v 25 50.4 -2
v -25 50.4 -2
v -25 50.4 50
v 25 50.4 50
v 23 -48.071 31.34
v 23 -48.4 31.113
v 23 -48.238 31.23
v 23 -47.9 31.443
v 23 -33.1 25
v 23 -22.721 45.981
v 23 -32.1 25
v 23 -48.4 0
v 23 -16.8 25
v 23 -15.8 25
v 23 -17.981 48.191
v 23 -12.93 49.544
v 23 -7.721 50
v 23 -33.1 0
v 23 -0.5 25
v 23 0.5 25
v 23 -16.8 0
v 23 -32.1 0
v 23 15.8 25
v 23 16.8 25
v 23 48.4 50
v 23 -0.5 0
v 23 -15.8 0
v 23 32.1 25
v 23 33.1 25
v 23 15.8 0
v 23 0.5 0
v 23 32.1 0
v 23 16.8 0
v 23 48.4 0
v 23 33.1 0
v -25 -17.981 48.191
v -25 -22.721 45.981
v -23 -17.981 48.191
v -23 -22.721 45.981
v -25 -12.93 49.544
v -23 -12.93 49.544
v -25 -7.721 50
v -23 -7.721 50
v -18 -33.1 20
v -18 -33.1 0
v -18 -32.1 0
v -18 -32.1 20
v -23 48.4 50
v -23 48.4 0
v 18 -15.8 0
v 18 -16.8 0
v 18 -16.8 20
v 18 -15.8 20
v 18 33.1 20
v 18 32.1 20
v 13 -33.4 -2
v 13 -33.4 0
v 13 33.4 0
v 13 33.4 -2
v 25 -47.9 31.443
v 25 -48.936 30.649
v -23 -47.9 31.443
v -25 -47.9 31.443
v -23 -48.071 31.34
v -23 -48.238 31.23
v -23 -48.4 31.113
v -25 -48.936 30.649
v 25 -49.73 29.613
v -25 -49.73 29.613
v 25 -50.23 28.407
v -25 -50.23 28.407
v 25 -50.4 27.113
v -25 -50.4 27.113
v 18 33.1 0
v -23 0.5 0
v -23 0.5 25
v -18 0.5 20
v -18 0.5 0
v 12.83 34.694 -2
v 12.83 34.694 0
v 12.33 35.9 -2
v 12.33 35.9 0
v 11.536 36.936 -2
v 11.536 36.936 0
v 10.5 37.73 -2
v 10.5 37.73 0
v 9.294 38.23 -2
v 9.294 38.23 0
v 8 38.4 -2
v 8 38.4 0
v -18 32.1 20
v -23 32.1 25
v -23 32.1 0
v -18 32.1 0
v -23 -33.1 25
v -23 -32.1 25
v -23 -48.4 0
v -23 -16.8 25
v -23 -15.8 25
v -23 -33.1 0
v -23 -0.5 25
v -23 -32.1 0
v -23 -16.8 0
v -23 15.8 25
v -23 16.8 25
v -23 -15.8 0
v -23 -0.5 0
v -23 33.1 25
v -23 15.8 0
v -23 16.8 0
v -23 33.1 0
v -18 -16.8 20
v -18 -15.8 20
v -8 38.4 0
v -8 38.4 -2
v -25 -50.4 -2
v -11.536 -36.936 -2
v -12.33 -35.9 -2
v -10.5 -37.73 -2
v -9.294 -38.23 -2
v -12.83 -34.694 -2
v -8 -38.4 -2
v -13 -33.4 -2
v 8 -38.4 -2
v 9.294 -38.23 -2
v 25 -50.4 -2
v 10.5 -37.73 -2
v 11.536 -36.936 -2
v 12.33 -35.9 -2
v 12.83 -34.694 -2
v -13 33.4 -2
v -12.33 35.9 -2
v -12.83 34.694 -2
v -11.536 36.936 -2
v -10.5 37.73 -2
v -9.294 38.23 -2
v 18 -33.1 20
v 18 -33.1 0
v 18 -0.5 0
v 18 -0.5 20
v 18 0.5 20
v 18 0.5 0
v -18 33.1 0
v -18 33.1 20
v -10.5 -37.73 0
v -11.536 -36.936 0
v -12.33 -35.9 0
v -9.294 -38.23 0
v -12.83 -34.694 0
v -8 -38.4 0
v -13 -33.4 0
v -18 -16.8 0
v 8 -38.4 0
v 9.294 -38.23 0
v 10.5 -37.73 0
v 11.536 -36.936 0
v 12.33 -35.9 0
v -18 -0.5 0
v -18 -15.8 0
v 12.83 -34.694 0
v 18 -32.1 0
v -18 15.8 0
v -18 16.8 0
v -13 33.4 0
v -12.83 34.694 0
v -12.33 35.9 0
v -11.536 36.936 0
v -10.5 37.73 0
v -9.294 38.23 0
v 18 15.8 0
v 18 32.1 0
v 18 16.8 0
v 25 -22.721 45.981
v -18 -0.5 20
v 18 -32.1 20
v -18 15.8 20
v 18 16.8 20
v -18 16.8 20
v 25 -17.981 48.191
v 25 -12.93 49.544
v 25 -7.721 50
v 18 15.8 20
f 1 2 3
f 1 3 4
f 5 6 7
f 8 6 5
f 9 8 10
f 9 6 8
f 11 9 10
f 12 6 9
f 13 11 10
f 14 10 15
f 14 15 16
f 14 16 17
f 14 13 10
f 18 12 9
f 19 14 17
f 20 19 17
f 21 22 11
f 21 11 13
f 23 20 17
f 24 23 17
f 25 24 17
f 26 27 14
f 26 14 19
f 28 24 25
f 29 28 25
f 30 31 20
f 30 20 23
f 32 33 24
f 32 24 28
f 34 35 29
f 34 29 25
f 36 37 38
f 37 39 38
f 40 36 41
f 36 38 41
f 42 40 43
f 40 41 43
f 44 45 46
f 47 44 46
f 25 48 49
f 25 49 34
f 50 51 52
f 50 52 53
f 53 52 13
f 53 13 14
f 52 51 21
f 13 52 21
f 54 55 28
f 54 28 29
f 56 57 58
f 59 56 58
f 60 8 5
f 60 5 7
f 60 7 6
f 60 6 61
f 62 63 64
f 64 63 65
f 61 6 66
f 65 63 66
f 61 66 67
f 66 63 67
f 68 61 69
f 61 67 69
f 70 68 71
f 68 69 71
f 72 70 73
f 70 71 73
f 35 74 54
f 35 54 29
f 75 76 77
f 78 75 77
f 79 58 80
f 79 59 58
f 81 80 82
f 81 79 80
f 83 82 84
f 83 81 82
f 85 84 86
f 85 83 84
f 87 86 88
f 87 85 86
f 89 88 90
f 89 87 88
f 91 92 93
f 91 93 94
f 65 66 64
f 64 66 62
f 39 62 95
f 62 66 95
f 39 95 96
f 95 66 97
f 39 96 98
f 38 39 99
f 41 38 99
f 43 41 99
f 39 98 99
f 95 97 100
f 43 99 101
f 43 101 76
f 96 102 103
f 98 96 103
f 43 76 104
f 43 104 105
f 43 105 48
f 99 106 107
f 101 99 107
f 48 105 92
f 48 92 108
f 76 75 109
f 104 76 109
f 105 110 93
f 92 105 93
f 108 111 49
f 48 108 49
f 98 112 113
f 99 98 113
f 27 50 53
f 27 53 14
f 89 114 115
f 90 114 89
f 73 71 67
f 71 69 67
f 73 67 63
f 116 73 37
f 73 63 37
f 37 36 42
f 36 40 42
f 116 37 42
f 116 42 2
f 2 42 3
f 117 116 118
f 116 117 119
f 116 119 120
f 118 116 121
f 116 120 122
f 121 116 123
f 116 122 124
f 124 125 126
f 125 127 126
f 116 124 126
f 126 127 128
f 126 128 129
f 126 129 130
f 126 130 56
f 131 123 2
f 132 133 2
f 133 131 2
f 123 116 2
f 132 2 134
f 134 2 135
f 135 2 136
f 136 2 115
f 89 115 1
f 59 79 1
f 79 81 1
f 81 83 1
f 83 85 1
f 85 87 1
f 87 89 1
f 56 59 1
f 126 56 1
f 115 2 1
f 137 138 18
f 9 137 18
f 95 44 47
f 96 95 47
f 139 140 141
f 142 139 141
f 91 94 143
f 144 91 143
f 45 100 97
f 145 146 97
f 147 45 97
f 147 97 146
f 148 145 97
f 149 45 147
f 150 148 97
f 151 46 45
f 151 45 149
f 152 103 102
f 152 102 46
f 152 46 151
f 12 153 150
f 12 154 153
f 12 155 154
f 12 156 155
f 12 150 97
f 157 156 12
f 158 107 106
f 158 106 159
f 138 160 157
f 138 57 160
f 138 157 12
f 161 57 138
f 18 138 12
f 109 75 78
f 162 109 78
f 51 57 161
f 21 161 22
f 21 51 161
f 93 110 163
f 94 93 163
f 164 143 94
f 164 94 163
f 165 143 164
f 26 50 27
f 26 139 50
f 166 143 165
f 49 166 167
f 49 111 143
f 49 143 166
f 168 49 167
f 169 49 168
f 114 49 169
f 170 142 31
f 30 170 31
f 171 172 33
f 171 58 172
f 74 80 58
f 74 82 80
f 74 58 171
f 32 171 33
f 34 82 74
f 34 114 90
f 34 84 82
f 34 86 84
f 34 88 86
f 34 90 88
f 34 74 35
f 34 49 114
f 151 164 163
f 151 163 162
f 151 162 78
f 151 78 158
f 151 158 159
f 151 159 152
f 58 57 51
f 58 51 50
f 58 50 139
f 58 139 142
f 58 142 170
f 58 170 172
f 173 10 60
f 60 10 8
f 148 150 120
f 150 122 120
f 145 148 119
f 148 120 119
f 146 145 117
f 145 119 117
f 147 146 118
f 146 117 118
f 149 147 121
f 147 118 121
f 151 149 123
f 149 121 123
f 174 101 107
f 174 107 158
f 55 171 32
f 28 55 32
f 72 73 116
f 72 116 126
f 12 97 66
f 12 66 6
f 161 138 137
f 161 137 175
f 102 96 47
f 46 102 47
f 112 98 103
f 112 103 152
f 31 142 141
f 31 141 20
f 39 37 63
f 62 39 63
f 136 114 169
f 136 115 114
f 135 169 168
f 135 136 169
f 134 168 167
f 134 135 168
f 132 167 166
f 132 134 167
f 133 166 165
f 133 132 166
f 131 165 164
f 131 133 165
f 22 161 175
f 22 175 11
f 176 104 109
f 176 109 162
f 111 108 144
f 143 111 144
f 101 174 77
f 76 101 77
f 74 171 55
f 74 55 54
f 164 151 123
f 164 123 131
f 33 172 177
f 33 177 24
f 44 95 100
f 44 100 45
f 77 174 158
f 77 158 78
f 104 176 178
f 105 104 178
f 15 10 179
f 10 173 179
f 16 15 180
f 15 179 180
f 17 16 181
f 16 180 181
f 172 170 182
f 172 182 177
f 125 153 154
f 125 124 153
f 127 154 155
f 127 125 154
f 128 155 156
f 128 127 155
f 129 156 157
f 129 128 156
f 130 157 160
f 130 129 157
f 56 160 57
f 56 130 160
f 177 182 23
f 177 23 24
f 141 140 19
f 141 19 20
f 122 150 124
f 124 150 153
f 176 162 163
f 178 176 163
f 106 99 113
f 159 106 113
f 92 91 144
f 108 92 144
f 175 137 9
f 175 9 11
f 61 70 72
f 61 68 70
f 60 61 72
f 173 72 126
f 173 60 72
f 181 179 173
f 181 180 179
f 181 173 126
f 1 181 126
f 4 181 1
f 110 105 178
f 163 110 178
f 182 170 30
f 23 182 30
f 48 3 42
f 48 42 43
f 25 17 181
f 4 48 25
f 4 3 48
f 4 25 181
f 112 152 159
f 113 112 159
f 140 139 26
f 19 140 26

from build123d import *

# Parameters (mm, degrees)
F0_W        = 50
F0_H        = 100.8
F0_W_2      = 46
F0_H_2      = 96.8
F1_DEPTH    = 50
F2_W        = 50
F2_H        = 100.8
F2_W_2      = 26
F2_H_2      = 76.8
F3_DEPTH    = 2
F4_T1_DEPTH = 229.2385588234
F5_R        = 30
F6_T1_DEPTH = 64.4337567297
F7_R        = 5
F8_W        = 5
F8_H        = 1
F9_DEPTH    = 25
F10_SIZE    = 4.99999


# Not quite as in the source:
# - a fillet or chamfer that OpenCascade refuses, or shapes differently, is made with other operations: its cross-section is extruded or revolved along the edge and cut away or added
# - a fillet or chamfer is up to 0.001 mm smaller than in the source, because OpenCascade refuses the exact size


with BuildPart() as f1:
    # F0 (on Top) → F1 (new body)
    with BuildSketch(Plane.XY):
        Rectangle(F0_W, F0_H)
        Rectangle(F0_W_2, F0_H_2, mode=Mode.SUBTRACT)
    extrude(amount=F1_DEPTH)

    # F2 (on Top) → F3 (join)
    with BuildSketch(Plane.XY):
        Rectangle(F2_W, F2_H)
        Rectangle(F2_W_2, F2_H_2, mode=Mode.SUBTRACT)
    extrude(amount=-F3_DEPTH)

    # F4: chamfer of 20 x 34.6410161514 on 1 edges, made by hand

    # F4_s2 → F4_t1 (cut)
    with BuildSketch(Plane.YZ.offset(-114.6192794117)):
        Polygon((-15.7589838486, 50), (-50.4, 30), (-50.4, 50), align=None)
    extrude(amount=F4_T1_DEPTH, mode=Mode.SUBTRACT)

    # F5
    f5_edges = [f1.edges().sort_by_distance(p)[0] for p in [
        (24, -15.758984, 50),
        (-24, -15.758984, 50),
    ]]
    fillet(f5_edges, radius=F5_R)

    # F6: fillet of radius 5 on 1 edges, made by hand

    # F6_s2 → F6_t1 (cut)
    with BuildSketch(Plane.YZ.offset(-32.2168783649)):
        with BuildLine():
            ThreePointArc((-47.9, 31.443375673), (-49.7301270189, 29.6132486541), (-50.4, 27.1132486541))
            Line((-50.4, 27.1132486541), (-50.4, 30))
            Line((-50.4, 30), (-47.9, 31.443375673))
        make_face()
    extrude(amount=F6_T1_DEPTH, mode=Mode.SUBTRACT)

    # F7
    f7_edges = [f1.edges().sort_by_distance(p)[0] for p in [
        (13, 38.4, -1),
        (-13, 38.4, -1),
        (13, -38.4, -1),
        (-13, -38.4, -1),
    ]]
    fillet(f7_edges, radius=F7_R)

    # F8 (on face) → F9 (join)
    with BuildSketch(Plane.XY):
        with Locations((-20.5, 32.6)):
            Rectangle(F8_W, F8_H)
        with Locations((-20.5, 16.3)):
            Rectangle(F8_W, F8_H)
        with Locations((-20.5, 0)):
            Rectangle(F8_W, F8_H)
        with Locations((-20.5, -16.3)):
            Rectangle(F8_W, F8_H)
        with Locations((-20.5, -32.6)):
            Rectangle(F8_W, F8_H)
        with Locations((20.5, -32.6)):
            Rectangle(F8_W, F8_H)
        with Locations((20.5, -16.3)):
            Rectangle(F8_W, F8_H)
        with Locations((20.5, 16.3)):
            Rectangle(F8_W, F8_H)
        with Locations((20.5, 0)):
            Rectangle(F8_W, F8_H)
        with Locations((20.5, 32.6)):
            Rectangle(F8_W, F8_H)
    extrude(amount=F9_DEPTH)

    # F10 (size 5 in the source; OpenCascade refuses exactly that, so slightly less here)
    f10_edges = [f1.edges().sort_by_distance(p)[0] for p in [
        (-18, 32.6, 25),
        (-18, 16.3, 25),
        (-18, 0, 25),
        (-18, -16.3, 25),
        (-18, -32.6, 25),
        (18, -32.6, 25),
        (18, -16.3, 25),
        (18, 0, 25),
        (18, 16.3, 25),
        (18, 32.6, 25),
    ]]
    chamfer(f10_edges, length=F10_SIZE)


solid = f1.part
